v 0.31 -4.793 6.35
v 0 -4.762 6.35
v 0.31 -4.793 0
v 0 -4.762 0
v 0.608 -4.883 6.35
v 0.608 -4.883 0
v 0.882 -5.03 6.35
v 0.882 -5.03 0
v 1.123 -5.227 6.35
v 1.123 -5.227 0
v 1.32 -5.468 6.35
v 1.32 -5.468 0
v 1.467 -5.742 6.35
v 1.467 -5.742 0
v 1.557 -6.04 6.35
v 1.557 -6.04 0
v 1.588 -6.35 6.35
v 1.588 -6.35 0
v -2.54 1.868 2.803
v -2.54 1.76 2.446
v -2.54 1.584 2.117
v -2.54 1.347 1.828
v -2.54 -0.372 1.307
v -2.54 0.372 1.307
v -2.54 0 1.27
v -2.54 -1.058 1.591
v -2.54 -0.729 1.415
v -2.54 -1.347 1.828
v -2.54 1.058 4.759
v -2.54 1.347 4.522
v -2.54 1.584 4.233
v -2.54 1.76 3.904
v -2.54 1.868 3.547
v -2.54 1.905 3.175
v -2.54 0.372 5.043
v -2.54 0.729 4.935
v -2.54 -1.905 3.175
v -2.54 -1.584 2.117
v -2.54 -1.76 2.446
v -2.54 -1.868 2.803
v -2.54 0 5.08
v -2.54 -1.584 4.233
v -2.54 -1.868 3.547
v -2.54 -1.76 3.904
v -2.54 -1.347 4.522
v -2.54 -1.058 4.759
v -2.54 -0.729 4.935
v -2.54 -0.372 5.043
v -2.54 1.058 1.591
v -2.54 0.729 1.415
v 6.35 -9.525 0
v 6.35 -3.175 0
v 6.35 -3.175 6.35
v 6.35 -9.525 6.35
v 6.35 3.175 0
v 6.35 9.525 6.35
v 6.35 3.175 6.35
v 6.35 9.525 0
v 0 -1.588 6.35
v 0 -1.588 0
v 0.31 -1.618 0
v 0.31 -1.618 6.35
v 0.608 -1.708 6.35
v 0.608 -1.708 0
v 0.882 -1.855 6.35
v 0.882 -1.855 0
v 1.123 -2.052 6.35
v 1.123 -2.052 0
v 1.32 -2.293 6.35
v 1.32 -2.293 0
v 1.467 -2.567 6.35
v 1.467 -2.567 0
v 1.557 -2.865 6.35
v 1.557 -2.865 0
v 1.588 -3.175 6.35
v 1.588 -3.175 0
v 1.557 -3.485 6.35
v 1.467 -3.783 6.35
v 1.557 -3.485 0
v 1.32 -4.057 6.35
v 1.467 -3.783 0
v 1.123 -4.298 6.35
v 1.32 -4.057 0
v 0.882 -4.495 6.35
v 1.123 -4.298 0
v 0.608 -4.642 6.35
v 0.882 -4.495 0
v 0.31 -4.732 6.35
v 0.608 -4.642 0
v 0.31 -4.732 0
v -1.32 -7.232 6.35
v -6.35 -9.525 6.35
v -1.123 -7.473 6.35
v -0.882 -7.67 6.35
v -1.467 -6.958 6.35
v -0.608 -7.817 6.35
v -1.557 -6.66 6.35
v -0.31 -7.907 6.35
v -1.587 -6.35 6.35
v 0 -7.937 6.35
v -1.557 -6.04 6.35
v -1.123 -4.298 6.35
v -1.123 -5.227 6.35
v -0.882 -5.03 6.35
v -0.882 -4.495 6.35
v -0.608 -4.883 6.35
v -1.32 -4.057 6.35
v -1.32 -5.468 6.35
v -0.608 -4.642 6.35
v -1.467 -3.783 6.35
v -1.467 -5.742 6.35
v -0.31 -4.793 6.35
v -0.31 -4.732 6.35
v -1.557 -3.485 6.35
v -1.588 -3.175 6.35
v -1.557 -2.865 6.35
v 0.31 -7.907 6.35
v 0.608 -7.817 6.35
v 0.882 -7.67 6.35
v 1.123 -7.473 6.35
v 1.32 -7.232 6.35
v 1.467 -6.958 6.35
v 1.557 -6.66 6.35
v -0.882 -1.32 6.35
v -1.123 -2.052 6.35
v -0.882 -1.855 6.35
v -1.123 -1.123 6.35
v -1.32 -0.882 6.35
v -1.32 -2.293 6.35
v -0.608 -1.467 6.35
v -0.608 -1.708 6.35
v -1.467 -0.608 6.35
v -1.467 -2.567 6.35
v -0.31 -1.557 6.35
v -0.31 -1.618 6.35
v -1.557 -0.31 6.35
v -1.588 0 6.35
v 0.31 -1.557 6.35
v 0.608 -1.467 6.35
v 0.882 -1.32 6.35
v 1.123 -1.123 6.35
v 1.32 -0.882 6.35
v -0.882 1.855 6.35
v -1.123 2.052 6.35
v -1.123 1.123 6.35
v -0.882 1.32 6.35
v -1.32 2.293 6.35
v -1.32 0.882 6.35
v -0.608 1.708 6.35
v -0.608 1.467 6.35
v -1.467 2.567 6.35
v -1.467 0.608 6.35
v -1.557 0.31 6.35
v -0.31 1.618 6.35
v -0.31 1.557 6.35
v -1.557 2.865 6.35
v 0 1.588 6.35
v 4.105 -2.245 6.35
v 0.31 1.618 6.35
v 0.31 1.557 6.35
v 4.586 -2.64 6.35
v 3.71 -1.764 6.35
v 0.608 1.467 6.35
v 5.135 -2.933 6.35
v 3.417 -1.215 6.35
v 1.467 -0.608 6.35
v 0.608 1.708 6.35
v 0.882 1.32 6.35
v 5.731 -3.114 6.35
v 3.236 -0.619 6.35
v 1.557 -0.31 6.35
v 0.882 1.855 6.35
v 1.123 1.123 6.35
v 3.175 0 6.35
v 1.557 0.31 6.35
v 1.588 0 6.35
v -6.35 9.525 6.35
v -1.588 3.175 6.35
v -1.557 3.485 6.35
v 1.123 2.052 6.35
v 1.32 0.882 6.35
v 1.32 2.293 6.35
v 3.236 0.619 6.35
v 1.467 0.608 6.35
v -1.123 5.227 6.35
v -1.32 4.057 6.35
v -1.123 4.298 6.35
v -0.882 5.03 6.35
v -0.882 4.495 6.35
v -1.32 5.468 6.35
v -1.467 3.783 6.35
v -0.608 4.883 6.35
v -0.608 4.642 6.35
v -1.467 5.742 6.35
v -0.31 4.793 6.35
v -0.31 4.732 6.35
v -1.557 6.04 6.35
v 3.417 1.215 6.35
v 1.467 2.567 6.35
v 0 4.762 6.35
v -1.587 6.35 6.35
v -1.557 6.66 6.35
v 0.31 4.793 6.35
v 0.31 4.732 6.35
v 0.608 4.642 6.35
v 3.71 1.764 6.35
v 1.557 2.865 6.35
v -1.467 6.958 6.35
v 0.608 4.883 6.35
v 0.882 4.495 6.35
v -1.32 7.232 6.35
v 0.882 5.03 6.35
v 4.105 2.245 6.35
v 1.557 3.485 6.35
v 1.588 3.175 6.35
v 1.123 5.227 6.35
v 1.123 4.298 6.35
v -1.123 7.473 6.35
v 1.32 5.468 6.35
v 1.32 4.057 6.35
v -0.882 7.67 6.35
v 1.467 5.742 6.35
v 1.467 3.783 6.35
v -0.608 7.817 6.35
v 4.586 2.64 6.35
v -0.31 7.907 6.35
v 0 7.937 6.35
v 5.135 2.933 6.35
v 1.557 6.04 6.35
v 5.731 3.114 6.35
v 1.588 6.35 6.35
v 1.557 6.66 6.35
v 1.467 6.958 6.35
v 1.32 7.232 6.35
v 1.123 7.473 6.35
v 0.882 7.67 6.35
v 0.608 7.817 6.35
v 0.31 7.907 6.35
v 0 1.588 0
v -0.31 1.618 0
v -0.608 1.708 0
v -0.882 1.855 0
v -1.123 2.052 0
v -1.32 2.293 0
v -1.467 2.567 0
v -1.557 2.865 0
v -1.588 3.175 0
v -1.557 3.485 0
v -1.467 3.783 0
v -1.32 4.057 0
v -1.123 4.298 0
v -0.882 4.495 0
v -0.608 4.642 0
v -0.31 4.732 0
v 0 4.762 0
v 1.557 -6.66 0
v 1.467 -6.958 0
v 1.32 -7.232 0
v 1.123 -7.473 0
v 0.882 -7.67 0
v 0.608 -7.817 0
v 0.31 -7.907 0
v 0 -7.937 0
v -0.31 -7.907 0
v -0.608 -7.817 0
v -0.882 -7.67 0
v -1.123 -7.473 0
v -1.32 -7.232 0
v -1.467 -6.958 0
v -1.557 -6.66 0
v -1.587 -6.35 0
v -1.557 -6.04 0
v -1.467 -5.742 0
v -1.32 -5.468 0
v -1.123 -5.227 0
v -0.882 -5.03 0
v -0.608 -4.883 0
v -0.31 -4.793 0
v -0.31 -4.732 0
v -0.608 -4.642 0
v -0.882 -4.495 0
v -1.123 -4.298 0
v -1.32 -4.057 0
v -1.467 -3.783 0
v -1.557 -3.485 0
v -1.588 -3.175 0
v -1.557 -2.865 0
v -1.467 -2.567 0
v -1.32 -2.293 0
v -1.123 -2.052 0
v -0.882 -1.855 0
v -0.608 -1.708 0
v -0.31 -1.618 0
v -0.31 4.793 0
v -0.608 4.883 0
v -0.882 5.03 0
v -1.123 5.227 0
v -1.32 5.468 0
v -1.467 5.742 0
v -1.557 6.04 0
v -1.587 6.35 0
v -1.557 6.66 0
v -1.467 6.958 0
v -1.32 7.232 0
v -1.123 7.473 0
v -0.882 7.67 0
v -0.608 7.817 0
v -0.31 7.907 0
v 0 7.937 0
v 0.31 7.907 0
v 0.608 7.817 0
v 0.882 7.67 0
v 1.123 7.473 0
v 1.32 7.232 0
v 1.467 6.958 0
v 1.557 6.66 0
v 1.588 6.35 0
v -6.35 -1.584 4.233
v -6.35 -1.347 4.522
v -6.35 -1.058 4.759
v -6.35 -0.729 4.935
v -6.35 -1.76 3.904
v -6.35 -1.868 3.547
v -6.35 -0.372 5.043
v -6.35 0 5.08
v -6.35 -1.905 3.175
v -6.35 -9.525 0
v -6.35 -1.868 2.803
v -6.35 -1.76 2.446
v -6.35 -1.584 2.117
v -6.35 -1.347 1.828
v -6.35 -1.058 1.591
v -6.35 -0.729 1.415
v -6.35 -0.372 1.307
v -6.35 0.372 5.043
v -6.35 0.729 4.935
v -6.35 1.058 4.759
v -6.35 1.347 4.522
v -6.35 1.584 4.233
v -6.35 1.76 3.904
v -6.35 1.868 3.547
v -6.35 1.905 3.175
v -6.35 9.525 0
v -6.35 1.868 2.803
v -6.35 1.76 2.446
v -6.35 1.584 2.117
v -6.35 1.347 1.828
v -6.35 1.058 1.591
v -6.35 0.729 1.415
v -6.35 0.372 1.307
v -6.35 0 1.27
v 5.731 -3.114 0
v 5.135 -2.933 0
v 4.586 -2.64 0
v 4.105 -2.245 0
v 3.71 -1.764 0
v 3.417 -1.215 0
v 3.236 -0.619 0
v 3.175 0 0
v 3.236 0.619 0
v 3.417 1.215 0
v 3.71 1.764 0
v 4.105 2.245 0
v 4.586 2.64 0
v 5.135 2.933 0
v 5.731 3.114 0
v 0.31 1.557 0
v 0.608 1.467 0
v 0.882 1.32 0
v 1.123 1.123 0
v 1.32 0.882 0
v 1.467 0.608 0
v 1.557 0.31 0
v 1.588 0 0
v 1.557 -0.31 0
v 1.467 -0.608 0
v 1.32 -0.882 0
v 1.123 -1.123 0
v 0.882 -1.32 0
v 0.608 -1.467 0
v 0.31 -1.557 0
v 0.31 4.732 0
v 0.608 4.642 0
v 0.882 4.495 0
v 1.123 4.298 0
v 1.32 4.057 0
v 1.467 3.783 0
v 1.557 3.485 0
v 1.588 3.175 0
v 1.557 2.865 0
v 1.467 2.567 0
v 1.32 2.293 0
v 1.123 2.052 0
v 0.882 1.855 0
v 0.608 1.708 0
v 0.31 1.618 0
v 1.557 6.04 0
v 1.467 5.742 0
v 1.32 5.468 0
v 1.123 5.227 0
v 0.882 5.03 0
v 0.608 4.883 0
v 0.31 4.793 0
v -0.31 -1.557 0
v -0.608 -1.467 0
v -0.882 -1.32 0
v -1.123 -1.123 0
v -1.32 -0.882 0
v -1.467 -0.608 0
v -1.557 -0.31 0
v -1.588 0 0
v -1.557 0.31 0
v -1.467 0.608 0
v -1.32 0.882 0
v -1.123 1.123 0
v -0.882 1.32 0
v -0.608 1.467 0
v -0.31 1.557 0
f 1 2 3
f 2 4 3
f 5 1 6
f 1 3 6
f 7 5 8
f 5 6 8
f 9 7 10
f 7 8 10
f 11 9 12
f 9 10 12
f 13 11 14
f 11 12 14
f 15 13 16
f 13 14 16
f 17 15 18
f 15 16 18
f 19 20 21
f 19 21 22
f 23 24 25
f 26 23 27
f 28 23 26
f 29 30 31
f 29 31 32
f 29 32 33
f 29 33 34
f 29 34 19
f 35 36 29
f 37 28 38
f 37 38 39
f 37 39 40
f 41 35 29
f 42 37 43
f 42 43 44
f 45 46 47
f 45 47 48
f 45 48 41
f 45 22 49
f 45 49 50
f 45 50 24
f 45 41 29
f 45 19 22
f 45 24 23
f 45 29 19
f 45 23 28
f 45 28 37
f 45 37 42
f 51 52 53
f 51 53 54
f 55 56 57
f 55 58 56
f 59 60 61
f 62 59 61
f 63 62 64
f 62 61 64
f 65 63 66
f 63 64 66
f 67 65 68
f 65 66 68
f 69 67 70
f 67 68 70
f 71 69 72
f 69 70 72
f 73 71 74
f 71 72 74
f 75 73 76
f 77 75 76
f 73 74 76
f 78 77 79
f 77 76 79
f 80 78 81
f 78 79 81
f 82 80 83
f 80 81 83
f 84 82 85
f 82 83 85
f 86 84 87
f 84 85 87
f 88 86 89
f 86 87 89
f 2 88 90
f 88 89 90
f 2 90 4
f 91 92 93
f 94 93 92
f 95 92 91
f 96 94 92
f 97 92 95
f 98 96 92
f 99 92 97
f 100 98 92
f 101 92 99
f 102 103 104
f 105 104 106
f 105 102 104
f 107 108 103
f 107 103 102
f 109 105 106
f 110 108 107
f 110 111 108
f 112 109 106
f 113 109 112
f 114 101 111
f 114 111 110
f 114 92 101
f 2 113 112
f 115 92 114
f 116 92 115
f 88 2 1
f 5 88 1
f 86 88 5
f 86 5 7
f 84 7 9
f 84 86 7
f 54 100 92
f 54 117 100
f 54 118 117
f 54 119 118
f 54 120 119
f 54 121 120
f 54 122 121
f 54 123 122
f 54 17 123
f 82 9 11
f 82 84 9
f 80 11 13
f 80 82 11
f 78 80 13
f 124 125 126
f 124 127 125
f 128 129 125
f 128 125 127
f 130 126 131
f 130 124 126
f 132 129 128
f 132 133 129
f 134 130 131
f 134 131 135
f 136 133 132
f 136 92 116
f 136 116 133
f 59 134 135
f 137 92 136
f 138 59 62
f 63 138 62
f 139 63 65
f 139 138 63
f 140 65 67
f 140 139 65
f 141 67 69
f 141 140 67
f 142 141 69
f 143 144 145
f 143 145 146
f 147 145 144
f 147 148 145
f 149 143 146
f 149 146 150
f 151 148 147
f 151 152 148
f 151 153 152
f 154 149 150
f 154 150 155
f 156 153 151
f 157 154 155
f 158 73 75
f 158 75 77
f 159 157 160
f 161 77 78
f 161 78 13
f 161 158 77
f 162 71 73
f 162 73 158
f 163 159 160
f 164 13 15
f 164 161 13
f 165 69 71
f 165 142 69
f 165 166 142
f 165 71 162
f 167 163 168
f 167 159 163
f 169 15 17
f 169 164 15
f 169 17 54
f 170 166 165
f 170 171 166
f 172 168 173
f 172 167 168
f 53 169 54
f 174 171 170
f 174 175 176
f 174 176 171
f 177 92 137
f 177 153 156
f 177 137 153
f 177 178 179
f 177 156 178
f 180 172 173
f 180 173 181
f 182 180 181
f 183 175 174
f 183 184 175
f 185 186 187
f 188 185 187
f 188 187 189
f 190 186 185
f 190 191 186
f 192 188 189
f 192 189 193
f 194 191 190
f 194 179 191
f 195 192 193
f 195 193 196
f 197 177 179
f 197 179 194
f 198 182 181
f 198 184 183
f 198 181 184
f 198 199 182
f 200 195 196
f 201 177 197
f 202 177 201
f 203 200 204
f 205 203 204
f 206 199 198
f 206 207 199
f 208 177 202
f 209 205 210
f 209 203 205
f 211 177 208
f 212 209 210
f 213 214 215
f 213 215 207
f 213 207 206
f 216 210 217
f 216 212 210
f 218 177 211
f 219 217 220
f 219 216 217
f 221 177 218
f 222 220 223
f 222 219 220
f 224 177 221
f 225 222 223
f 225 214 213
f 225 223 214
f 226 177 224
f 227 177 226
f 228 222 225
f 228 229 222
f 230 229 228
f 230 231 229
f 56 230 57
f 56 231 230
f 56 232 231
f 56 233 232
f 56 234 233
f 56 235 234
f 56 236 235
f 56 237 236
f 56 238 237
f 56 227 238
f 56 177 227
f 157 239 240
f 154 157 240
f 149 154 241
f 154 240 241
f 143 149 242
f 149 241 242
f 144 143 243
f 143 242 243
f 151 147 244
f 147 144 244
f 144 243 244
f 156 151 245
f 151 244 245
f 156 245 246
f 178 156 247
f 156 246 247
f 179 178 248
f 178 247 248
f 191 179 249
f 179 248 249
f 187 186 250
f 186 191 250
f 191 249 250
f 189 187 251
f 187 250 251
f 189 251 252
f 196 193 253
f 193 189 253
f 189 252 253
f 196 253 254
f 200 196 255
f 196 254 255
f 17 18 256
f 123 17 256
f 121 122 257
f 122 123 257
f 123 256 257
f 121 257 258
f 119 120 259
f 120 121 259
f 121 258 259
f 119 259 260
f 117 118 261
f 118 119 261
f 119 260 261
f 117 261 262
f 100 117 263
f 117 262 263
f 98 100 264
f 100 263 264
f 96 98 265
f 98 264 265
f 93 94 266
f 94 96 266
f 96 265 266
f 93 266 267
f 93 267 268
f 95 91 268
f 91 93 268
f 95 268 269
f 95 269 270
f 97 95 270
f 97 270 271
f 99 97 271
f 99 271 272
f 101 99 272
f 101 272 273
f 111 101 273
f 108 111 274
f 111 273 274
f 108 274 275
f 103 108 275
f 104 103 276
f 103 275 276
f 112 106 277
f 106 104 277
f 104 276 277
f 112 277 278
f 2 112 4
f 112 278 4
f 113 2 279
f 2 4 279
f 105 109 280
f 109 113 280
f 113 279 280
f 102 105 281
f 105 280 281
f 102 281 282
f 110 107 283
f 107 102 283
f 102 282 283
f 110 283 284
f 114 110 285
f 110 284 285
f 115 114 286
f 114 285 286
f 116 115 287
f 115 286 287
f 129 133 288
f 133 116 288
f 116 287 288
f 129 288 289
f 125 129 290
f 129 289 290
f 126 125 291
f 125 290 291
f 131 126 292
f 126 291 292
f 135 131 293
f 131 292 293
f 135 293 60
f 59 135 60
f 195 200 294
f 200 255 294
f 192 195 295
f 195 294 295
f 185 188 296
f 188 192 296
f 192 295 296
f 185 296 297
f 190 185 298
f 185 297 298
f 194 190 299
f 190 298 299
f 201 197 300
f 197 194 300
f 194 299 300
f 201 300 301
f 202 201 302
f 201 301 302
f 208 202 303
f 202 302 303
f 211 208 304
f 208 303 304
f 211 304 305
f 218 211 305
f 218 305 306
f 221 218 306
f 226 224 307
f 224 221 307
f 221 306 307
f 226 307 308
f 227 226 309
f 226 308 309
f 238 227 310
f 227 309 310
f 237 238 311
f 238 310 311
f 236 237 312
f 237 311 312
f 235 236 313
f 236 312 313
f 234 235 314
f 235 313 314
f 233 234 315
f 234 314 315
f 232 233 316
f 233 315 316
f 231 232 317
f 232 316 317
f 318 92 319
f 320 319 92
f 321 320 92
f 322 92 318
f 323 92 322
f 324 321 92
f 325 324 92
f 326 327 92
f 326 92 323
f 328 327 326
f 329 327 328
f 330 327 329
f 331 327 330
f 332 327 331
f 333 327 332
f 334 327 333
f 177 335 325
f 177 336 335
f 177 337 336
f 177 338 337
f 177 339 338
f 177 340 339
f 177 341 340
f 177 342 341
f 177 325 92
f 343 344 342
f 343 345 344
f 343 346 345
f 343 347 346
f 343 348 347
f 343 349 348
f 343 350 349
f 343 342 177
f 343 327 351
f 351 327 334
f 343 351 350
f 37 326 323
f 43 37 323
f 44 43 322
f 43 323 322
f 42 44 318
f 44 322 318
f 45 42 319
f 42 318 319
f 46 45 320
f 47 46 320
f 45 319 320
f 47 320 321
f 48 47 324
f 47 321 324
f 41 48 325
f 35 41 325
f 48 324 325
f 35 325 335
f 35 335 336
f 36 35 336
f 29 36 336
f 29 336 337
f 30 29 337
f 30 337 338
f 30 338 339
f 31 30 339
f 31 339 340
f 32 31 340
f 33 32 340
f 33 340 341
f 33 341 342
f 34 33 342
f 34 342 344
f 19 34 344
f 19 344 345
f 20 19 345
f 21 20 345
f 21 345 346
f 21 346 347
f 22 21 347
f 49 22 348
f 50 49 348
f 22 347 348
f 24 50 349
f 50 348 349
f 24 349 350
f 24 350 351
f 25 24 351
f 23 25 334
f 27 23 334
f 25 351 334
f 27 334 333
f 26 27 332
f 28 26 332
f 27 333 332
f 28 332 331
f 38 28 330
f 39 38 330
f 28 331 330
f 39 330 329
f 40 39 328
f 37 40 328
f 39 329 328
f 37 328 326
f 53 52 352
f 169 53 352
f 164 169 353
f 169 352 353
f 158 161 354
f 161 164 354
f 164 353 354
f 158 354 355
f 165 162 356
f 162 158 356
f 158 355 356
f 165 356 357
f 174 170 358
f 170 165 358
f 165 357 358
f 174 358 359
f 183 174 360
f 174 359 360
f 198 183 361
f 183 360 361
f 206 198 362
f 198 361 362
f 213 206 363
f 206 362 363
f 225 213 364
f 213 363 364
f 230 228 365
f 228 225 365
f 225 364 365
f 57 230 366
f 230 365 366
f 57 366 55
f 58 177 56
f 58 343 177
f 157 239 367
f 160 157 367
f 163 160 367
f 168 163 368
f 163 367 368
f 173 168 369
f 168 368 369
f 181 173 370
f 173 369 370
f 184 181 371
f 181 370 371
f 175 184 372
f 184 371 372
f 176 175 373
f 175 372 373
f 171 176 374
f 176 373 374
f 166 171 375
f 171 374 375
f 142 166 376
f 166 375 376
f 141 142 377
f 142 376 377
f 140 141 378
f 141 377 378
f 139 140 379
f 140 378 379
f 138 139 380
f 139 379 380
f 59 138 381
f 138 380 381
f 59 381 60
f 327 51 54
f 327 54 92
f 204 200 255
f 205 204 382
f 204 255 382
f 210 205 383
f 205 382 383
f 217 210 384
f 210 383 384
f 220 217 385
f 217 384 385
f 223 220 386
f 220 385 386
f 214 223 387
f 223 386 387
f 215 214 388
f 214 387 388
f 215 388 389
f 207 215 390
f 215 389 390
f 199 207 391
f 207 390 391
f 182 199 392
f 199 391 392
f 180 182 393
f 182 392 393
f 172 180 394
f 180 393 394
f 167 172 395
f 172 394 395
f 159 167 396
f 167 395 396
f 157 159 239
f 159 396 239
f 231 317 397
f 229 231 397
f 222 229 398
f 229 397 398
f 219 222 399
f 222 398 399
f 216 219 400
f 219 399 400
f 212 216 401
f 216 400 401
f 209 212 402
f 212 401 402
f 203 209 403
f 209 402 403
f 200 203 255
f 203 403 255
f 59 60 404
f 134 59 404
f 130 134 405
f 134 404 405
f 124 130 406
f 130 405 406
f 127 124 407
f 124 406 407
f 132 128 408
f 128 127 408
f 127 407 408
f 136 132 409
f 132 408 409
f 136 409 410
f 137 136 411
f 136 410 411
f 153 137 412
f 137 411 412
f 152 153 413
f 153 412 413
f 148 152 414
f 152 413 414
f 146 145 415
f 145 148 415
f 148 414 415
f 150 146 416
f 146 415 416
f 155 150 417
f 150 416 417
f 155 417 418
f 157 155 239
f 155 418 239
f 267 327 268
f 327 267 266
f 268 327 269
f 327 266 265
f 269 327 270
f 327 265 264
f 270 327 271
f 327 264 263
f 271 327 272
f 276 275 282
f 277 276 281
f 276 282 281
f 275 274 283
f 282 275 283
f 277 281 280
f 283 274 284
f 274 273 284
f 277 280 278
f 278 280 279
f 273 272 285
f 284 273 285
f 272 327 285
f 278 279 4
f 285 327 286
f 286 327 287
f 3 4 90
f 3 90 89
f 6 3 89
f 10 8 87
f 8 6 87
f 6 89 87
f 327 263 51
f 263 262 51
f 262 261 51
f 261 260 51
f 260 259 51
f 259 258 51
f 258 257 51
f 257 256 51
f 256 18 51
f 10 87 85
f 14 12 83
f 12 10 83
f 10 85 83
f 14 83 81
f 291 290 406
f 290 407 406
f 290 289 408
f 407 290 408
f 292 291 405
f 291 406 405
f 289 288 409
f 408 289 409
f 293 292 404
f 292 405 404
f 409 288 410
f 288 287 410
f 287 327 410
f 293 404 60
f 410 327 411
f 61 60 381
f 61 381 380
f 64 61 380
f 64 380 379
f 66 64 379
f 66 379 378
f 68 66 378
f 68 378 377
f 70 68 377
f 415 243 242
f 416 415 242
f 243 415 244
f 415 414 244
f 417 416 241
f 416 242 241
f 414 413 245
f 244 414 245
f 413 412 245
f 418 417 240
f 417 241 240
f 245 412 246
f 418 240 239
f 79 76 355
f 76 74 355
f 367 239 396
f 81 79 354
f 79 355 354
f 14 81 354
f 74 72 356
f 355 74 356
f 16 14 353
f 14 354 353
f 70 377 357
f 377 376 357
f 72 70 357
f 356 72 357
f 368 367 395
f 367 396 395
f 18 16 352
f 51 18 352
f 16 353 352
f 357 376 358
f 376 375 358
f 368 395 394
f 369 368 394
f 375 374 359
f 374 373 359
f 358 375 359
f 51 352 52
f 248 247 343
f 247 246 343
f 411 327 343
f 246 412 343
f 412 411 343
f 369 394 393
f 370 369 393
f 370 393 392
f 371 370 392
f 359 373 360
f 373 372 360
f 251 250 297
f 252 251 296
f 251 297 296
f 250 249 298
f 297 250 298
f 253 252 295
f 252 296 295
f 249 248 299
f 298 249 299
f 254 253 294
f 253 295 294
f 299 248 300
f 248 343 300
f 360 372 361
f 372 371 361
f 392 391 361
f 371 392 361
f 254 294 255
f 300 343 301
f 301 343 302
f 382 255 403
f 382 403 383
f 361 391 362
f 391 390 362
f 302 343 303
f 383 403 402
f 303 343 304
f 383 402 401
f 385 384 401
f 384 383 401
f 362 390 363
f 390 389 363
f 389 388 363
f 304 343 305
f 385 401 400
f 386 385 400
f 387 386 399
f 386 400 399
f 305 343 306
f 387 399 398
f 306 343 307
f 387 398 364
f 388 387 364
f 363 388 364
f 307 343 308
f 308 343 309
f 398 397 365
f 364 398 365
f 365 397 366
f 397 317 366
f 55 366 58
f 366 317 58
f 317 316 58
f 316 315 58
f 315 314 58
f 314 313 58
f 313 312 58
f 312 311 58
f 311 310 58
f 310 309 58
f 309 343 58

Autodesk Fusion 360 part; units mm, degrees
sketch "Sketch1" plane through (0, 0, 0) normal (0, 0, 1) x (1, 0, 0)
  line L0 (-6.35, 9.525) -> (6.35, 9.525)
  line L1 (6.35, 9.525) -> (6.35, -9.525)
  line L2 (6.35, -9.525) -> (-6.35, -9.525)
  line L3 (-6.35, -9.525) -> (-6.35, 9.525)
  line L4 (0, 0) -> (0, 3.175) construction
  line L5 (0, 3.175) -> (0, 6.35) construction
  line L6 (0, 0) -> (0, -3.175) construction
  line L7 (0, -3.175) -> (0, -6.35) construction
  circle A0 centre (0, 6.35) radius 1.5875
  circle A1 centre (0, 3.175) radius 1.5875
  circle A2 centre (0, 0) radius 1.5875
  circle A3 centre (0, -3.175) radius 1.5875
  circle A4 centre (0, -6.35) radius 1.5875
  arc A5 (6.35, 3.175) -> (6.35, -3.175) centre (6.35, 0) ccw
  dimension "d3" = 12.7
  dimension "d4" = 19.05
  dimension "d5" = 3.175
  dimension "d6" = 3.175
  dimension "d7" = 3.175
  dimension "d8" = 3.175
  dimension "d9" = 3.175
  dimension "d10" = 3.175
  dimension "d11" = 3.175
  dimension "d12" = 3.175
  dimension "d13" = 3.175
  dimension "d21" = 6.35
extrude "Extrude1" add sketch "Sketch1" along normal blind 6.35 contours L0 L1 L2 L3 A5
sketch "Sketch2" plane through (0, 0, 6.35) normal (0, 0, 1) x (-1, 0, 0)
  circle A0 centre (0, 6.35) radius 1.5875
  circle A1 centre (0, -6.35) radius 1.5875
  line L0 (6.35, 9.525) -> (-6.35, 9.525)
  line L1 (-6.35, -3.175) -> (-6.35, -9.525)
  line L2 (-6.35, -9.525) -> (6.35, -9.525)
  line L3 (6.35, -9.525) -> (6.35, 9.525)
  arc A2 (1.905, 6.35) -> (-1.905, 6.35) centre (0, 6.35) ccw
  arc A3 (-1.905, -6.35) -> (1.905, -6.35) centre (0, -6.35) ccw
  circle A4 centre (0, -3.175) radius 1.5875
  arc A5 (0, -1.5875) -> (0, 1.5875) centre (0, 0) ccw
  arc A6 (0, 1.5875) -> (0, 4.7625) centre (0, 3.175) ccw
  arc A7 (0, -1.5875) -> (0, -4.7625) centre (0, -3.175) ccw
  arc A8 (0, 1.5875) -> (0, -1.5875) centre (0, 0) ccw
  arc A9 (0, 4.7625) -> (0, 1.5875) centre (0, 3.175) ccw
  line L4 (-6.35, 9.525) -> (-6.35, 3.175)
  arc A10 (-6.35, -3.175) -> (-6.35, 3.175) centre (-6.35, 0) ccw
  dimension "d17" = 3.81
  dimension "d18" = 3.81
sketch "Sketch3" plane through (0, 0, 6.35) normal (0, 0, 1) x (-1, 0, 0)
  circle A0 centre (0, 6.35) radius 1.5875
  arc A1 (0, 1.5875) -> (0, 4.7625) centre (0, 3.175) ccw
  arc A2 (0, -1.5875) -> (0, 1.5875) centre (0, 0) ccw
  arc A3 (0, -4.7625) -> (0, -1.5875) centre (0, -3.175) ccw
  circle A4 centre (0, -6.35) radius 1.5875
  arc A5 (0, -1.5875) -> (0, -4.7625) centre (0, -3.175) ccw
  arc A6 (0, 1.5875) -> (0, -1.5875) centre (0, 0) ccw
  arc A7 (0, 4.7625) -> (0, 1.5875) centre (0, 3.175) ccw
  line L0 (-6.35, -3.175) -> (-6.35, -9.525)
  line L1 (-6.35, -9.525) -> (6.35, -9.525)
  line L2 (6.35, -9.525) -> (6.35, 9.525)
  line L3 (6.35, 9.525) -> (-6.35, 9.525)
  line L4 (-6.35, 9.525) -> (-6.35, 3.175)
  arc A8 (-6.35, -3.175) -> (-6.35, 3.175) centre (-6.35, 0) ccw
sketch "Sketch4" plane through (-6.35, 0, 0) normal (-1, 0, 0) x (0, -1, 0)
  line L0 (-9.525, 0) -> (9.525, 0)
  line L1 (9.525, 0) -> (9.525, 6.35)
  line L2 (9.525, 6.35) -> (-9.525, 6.35)
  line L3 (-9.525, 6.35) -> (-9.525, 0)
  line L4 (0, 0) -> (0, 3.175) construction
  circle A0 centre (0, 3.175) radius 1.905
  dimension "d22" = 3.175
  dimension "d23" = 3.81
extrude "Extrude3" cut sketch "Sketch4" against normal blind 3.81 contours A0
thread "Thread1" thread offset 0 thread length 10.0076
equation "d9 = ( 1 / 8 ) * 1 in"
equation "d10 = ( 1 / 8 ) * 1 in"
equation "d11 = ( 1 / 8 ) * 1 in"
equation "d13 = ( 1 / 8 ) * 1 in"
equation "d21 = ( 1 / 4 ) * 1 in"
equation "d22 = ( 1 / 8 ) * 1 in"
